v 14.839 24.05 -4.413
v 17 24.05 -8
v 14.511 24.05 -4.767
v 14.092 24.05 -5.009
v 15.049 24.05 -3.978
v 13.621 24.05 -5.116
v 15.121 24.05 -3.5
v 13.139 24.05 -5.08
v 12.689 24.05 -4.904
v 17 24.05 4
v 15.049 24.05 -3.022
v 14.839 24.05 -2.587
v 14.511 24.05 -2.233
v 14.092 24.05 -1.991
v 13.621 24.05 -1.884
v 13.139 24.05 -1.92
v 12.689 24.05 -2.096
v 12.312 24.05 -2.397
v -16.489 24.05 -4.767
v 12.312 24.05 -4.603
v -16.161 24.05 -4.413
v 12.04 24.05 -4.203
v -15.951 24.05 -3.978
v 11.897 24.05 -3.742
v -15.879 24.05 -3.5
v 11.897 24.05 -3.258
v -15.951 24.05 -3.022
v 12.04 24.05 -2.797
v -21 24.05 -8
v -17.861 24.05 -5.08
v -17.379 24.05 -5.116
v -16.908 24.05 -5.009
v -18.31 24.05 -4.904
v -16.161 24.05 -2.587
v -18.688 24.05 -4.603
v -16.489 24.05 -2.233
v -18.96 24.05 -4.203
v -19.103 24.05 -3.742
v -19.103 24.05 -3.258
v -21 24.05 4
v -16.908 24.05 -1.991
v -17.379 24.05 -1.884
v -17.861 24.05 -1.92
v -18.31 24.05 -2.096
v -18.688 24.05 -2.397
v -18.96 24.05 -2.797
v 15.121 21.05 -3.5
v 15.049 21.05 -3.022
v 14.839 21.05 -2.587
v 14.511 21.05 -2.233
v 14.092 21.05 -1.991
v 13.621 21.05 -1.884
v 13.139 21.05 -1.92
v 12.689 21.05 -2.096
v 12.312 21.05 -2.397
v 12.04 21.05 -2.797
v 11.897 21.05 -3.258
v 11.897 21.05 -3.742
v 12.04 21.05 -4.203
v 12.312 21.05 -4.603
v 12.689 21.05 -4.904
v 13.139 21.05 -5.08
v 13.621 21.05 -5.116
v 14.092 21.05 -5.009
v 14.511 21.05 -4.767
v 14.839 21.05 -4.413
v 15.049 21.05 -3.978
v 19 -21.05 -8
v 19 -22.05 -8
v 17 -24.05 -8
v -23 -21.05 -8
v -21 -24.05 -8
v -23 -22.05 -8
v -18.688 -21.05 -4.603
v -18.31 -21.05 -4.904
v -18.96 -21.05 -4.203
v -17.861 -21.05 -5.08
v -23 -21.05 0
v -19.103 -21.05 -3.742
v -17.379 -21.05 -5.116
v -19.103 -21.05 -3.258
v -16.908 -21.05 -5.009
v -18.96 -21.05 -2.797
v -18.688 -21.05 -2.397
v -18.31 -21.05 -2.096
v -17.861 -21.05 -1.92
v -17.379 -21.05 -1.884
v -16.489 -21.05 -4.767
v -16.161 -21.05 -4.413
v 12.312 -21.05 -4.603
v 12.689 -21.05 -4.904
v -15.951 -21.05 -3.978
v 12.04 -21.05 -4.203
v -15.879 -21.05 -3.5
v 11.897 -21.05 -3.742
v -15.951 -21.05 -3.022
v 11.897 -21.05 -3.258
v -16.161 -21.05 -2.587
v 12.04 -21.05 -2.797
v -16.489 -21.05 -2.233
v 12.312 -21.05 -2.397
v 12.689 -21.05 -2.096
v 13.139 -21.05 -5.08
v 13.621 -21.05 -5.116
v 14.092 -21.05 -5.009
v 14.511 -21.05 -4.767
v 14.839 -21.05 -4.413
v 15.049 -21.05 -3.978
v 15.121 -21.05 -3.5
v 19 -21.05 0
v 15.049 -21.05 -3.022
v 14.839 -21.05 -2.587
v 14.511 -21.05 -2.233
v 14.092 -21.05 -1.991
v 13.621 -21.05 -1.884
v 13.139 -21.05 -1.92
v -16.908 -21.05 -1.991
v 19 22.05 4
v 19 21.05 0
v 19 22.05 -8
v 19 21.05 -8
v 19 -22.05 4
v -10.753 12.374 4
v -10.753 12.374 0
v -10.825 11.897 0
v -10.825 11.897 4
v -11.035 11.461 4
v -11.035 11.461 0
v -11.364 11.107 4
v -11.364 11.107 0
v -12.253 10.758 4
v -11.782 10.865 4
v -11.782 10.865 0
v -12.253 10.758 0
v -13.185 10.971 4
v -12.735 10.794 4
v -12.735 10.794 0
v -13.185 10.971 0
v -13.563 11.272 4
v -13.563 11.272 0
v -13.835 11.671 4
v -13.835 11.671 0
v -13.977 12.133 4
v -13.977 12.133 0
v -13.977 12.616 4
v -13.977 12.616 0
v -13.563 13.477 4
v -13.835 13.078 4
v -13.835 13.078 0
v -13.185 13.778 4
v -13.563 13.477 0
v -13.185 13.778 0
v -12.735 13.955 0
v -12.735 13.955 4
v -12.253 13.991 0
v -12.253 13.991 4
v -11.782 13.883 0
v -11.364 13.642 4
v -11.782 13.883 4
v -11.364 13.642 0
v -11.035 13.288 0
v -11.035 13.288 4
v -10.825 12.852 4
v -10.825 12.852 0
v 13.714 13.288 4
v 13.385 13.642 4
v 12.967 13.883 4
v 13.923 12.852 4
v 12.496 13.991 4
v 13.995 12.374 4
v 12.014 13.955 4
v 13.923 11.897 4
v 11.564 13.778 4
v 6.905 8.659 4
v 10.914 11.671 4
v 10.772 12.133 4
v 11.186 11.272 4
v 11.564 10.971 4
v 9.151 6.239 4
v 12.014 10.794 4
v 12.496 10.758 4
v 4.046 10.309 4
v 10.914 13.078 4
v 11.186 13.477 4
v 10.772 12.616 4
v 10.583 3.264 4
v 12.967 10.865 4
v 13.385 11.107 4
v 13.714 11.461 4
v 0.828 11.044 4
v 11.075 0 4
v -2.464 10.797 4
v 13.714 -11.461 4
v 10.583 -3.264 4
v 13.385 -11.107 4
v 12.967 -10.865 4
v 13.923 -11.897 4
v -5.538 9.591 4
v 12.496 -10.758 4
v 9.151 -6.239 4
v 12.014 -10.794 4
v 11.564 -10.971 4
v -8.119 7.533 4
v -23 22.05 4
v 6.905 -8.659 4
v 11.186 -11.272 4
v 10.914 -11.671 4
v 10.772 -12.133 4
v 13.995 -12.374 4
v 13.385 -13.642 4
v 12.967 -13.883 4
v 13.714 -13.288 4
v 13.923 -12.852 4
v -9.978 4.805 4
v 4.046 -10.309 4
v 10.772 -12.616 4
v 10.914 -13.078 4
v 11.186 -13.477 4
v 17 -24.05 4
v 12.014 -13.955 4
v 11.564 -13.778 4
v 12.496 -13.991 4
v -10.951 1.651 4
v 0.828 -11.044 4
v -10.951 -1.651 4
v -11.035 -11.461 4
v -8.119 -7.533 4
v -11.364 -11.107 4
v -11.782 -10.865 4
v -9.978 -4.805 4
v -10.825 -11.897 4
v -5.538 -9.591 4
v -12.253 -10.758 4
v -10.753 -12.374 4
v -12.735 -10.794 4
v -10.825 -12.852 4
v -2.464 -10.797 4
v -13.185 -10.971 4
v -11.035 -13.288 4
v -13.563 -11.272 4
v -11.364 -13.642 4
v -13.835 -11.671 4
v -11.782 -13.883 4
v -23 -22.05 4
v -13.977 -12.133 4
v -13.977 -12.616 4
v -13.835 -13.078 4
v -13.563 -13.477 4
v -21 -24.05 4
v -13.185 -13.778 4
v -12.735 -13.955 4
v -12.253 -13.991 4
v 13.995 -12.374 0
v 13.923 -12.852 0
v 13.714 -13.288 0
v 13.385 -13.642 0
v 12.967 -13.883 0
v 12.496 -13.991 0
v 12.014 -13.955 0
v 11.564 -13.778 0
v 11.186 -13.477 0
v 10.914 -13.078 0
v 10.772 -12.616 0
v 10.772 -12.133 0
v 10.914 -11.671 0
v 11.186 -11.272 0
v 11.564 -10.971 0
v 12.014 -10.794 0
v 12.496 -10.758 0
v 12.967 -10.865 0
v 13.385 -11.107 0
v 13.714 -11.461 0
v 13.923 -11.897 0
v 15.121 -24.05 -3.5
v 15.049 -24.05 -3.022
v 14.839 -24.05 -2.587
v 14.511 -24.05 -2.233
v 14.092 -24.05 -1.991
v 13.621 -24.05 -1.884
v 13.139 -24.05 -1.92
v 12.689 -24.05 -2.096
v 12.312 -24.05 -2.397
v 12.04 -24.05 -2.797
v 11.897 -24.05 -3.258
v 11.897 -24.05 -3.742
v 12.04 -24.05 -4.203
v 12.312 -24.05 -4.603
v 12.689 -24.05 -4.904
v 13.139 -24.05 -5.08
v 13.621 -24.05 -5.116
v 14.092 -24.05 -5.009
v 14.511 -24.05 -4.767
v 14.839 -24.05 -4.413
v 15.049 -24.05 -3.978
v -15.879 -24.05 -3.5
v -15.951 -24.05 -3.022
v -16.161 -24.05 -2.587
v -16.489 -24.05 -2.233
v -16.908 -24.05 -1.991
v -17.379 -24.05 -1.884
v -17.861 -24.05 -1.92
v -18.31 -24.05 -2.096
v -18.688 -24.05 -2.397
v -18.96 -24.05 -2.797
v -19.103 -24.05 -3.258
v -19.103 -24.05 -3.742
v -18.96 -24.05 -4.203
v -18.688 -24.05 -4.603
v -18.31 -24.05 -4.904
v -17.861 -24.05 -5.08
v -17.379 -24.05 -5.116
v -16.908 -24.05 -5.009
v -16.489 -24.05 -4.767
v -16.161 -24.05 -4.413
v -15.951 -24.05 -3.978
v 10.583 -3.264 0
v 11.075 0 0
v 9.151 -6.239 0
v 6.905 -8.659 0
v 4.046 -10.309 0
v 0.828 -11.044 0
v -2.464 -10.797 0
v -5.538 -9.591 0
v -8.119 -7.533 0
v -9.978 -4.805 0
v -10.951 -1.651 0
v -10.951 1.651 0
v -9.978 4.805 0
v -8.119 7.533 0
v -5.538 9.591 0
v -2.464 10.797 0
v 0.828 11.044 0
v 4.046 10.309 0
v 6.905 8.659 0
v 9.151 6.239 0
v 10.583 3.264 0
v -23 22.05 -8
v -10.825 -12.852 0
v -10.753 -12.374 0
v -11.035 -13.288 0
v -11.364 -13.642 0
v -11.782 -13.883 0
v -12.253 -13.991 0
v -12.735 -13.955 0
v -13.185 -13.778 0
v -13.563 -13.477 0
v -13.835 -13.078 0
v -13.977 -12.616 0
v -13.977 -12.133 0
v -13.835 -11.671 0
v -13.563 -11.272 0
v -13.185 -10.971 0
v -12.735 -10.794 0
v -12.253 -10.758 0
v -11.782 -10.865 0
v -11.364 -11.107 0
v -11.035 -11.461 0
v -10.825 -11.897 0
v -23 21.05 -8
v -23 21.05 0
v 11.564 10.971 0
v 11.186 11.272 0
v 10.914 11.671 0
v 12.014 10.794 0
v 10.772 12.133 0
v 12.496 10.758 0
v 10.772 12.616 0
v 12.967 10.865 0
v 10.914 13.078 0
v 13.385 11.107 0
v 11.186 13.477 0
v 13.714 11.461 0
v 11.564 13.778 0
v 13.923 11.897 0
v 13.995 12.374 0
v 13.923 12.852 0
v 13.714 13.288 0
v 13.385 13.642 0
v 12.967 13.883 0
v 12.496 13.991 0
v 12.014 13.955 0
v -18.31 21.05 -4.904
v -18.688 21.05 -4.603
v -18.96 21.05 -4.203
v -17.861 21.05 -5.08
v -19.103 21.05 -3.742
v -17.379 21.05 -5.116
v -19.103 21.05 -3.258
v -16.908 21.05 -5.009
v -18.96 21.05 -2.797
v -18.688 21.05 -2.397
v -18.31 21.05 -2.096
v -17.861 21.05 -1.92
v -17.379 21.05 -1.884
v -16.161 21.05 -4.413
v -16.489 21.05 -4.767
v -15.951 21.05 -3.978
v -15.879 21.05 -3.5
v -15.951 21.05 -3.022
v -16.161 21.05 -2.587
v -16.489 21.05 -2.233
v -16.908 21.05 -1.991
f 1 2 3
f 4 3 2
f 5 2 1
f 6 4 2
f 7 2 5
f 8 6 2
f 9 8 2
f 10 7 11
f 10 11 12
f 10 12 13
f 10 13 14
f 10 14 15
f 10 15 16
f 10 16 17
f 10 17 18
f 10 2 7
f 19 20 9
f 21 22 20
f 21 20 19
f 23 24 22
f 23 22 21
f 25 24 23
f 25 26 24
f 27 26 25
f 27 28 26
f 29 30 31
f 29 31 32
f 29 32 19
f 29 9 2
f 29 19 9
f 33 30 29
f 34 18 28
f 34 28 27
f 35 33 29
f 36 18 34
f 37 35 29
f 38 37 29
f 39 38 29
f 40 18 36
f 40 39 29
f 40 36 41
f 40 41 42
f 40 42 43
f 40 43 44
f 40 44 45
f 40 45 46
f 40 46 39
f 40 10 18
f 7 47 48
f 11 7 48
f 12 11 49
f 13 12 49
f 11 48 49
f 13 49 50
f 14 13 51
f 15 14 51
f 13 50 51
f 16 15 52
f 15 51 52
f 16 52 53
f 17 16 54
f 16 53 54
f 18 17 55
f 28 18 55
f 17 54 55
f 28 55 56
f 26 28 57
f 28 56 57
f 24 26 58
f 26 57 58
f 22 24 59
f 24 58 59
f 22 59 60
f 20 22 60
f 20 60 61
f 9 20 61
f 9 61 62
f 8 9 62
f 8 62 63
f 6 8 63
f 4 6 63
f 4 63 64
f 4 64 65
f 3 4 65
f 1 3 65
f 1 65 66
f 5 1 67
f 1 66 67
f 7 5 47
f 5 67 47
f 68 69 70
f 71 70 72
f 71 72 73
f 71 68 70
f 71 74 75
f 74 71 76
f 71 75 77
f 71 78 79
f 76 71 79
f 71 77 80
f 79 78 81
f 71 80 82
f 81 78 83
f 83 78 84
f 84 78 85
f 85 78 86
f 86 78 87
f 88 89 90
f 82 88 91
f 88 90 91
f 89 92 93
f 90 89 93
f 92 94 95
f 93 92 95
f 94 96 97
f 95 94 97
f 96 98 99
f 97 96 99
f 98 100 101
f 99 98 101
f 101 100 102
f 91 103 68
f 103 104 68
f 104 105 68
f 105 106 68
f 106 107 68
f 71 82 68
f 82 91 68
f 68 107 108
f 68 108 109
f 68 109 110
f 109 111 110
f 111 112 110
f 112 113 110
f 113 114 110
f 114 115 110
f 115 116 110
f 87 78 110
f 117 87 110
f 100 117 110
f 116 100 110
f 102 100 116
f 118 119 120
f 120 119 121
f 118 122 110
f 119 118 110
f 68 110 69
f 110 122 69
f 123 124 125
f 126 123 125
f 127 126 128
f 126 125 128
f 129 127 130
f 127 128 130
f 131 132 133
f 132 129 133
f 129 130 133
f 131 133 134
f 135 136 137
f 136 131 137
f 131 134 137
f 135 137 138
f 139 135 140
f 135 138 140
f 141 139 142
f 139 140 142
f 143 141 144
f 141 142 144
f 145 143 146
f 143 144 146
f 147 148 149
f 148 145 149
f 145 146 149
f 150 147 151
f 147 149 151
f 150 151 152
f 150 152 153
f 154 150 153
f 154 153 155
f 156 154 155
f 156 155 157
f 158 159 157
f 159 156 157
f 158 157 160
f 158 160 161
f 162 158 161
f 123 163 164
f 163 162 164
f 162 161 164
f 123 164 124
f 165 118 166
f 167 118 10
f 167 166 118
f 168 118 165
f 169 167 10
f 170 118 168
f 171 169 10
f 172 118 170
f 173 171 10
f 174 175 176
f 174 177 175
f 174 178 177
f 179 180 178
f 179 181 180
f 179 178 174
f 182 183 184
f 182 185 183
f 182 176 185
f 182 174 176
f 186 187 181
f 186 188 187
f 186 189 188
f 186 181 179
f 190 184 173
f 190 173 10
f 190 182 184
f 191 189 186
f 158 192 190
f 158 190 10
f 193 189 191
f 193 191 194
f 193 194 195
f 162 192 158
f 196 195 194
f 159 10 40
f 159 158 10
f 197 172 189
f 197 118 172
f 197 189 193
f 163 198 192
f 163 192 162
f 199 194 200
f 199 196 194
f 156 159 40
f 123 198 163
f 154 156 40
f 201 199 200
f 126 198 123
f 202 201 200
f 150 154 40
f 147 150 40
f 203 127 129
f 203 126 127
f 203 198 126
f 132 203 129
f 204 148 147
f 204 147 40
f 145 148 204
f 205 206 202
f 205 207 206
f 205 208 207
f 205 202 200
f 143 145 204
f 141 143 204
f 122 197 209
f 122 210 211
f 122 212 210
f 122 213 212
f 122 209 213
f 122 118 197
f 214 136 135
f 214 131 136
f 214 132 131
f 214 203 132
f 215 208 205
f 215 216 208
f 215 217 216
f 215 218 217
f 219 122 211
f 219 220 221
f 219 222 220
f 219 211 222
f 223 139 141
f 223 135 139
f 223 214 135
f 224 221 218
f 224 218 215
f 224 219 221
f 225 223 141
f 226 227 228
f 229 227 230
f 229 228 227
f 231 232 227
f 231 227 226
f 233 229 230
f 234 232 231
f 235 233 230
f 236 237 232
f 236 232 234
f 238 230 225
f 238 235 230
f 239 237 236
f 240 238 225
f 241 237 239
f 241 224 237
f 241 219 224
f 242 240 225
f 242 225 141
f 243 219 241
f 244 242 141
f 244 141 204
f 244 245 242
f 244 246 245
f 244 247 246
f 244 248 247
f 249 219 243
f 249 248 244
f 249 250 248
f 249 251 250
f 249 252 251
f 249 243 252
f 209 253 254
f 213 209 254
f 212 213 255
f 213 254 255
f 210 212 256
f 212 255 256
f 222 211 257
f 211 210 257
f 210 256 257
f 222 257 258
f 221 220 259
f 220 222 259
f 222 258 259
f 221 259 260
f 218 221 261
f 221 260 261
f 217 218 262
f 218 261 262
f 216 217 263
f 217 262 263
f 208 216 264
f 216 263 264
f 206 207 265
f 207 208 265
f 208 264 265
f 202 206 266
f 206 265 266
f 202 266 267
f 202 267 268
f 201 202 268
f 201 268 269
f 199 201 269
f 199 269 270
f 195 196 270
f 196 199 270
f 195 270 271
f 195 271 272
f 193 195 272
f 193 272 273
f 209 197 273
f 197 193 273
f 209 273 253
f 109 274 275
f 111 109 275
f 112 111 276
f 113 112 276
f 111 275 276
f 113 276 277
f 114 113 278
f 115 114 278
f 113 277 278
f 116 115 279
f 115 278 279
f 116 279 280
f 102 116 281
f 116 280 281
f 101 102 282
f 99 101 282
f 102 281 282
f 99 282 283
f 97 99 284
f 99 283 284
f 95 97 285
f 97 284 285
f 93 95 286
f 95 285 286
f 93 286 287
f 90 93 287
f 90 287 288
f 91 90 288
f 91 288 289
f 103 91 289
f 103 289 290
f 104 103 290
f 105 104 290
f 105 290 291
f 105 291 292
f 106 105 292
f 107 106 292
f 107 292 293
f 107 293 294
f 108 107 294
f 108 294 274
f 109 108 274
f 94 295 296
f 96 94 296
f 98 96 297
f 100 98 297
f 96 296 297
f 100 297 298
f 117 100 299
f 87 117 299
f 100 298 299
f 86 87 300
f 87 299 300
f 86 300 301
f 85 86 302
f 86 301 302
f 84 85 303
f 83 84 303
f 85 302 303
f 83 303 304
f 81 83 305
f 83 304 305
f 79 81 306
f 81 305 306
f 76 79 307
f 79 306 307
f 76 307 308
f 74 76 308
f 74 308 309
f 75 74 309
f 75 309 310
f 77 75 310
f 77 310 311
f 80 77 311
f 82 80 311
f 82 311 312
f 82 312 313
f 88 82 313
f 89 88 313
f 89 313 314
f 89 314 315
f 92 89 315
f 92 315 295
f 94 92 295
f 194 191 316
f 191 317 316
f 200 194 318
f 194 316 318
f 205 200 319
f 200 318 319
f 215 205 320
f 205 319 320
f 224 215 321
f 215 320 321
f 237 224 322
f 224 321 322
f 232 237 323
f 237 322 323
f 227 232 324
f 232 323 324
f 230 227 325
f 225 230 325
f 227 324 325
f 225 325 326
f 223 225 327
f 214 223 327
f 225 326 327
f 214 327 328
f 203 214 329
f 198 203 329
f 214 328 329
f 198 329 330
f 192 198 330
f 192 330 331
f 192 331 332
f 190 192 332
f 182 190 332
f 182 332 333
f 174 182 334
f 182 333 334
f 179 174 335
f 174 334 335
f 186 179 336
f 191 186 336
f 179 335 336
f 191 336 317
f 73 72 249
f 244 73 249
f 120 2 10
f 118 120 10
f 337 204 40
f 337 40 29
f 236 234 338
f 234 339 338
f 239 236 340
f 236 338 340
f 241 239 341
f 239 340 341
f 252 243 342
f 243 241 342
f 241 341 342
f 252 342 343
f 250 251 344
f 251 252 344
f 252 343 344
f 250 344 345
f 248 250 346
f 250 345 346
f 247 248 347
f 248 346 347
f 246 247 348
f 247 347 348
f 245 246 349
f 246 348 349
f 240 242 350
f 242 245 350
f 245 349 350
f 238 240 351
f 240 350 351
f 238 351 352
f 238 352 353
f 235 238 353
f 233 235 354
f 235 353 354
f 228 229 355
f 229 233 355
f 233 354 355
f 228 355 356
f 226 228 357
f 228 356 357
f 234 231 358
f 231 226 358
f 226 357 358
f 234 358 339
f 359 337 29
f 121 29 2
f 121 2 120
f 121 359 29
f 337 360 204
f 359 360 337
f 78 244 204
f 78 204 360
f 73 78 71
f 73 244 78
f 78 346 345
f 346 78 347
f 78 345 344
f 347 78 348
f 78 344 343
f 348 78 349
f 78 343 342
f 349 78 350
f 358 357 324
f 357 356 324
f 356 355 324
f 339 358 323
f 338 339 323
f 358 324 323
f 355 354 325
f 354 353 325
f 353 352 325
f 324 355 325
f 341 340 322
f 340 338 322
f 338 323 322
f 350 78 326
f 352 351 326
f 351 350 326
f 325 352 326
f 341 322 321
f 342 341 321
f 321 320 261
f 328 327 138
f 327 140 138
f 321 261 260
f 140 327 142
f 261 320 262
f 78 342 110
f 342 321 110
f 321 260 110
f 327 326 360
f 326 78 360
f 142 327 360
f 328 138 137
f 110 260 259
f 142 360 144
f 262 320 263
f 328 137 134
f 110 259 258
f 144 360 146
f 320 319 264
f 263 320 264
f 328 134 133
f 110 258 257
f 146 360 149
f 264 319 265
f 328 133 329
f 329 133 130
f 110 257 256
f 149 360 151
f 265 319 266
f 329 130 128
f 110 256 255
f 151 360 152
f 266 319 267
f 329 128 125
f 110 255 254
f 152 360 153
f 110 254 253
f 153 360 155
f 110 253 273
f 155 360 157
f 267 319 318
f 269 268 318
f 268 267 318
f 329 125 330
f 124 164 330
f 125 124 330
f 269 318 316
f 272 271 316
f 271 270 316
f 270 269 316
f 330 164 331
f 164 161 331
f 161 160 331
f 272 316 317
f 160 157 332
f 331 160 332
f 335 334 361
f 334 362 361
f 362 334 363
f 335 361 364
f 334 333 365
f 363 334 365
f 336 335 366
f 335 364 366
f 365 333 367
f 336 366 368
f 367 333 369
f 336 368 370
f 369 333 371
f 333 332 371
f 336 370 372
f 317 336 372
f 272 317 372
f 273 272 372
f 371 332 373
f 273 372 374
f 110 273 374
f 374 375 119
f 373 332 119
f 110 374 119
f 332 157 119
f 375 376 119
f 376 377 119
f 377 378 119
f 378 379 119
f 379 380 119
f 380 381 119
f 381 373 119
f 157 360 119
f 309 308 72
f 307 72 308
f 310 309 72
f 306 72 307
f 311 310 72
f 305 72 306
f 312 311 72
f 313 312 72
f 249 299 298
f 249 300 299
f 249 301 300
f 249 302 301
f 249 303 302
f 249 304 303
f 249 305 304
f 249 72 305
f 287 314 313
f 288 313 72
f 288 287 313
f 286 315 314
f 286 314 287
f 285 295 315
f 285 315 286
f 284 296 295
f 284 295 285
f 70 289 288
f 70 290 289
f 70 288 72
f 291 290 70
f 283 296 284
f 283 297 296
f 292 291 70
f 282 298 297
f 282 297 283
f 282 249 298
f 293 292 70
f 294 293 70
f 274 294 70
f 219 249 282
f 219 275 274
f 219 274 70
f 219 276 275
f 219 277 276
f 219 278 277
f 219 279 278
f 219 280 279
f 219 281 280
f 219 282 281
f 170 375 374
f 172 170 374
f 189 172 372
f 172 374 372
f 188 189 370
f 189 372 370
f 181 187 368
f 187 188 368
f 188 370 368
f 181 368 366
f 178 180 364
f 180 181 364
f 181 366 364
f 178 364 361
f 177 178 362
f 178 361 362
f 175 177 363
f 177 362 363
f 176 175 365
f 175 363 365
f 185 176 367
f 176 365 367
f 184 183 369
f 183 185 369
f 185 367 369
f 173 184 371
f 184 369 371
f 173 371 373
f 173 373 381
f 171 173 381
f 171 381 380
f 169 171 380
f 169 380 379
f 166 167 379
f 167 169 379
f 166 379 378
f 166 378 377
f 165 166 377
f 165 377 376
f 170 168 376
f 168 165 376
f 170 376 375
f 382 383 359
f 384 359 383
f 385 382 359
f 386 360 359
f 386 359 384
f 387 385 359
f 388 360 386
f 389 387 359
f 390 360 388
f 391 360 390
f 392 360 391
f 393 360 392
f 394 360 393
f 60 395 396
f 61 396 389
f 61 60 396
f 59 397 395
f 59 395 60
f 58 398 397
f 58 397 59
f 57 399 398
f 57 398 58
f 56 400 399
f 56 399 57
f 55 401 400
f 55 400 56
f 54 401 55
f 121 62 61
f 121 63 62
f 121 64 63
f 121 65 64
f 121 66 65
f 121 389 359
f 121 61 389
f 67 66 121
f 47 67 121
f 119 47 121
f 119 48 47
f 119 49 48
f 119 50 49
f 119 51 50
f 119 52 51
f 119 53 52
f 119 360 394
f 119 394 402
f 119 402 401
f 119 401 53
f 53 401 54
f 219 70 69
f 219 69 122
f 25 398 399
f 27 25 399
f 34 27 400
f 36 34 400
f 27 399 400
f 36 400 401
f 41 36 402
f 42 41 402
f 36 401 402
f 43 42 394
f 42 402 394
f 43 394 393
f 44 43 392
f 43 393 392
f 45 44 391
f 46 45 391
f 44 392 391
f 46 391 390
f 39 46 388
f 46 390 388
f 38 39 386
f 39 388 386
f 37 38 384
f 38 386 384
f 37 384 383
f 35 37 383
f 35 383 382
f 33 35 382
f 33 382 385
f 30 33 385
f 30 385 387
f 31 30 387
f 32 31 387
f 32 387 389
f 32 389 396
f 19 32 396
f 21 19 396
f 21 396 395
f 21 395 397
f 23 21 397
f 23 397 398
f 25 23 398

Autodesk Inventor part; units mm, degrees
ref_plane "YZ Plane" through (0, 0, 0) normal (1, 0, 0) x (0, 1, 0)
ref_plane "XZ Plane" through (0, 0, 0) normal (0, 1, 0) x (-1, 0, 0)
sketch "Base" plane through (0, 0, 0) normal (0, 0, 1) x (1, 0, 0)
  circle A0 centre (0, 0) radius 11 construction
  line L0 (18, 21) -> (-22, 21) construction
  line L1 (-22, -21) -> (18, -21) construction
  line L2 (19, -20) -> (19, 20) construction
  line L3 (-23, 20) -> (-23, -20) construction
  circle A1 centre (0, 0) radius 11.075
  line L4 (-197.84, 0) -> (55.14, 0) construction
  line L5 (-23, 23.05) -> (19, 23.05)
  line L6 (19, 23.05) -> (19, 21.05)
  line L7 (19, 21.05) -> (-23, 21.05)
  line L8 (-23, 21.05) -> (-23, 23.05)
  line L9 (-23, 21.05) -> (19, 21.05)
  line L10 (19, 21.05) -> (19, 0)
  line L11 (19, 0) -> (-23, 0)
  line L12 (-23, 0) -> (-23, 21.05)
  line L13 (-23, -23.05) -> (19, -23.05)
  line L14 (19, -23.05) -> (19, -21.05)
  line L15 (19, -21.05) -> (-23, -21.05)
  line L16 (-23, -21.05) -> (-23, -23.05)
  line L17 (19, -21.05) -> (19, 0)
  line L18 (-23, 0) -> (-23, -21.05)
  line L19 (0, 14) -> (0, 0) construction
  line L20 (0, 0) -> (0, -14) construction
  circle A2 centre (12.3744, -12.3744) radius 1.621 projected
  circle A3 centre (12.3744, 12.3744) radius 1.621 projected
  circle A4 centre (-12.3744, 12.3744) radius 1.621 projected
  circle A5 centre (-12.3744, -12.3744) radius 1.621 projected
  dimension "d0" = 22.15
  dimension "d1" = 2
  dimension "d4" = 0.05
extrude "BaseFeature" add sketch "Base" along normal blind 4 contours L11 L17 L15 L18 A1 | A1 L11 L12 L7 L10 | L7 L8 L5 L6 | L14 L13 L16 L15
ref_plane "Work Plane1" through (-20.5858, -18.5858, -56) normal (0, 0, -1) x (0, 1, 0)
sketch "Sides" plane through (0, 0, 0) normal (0, 0, -1) x (-1, 0, 0)
  line L0 (23, -23.05) -> (-19, -23.05) projected
  line L1 (-19, -23.05) -> (23, -23.05)
  line L2 (23, -23.05) -> (23, -21.05)
  line L3 (23, -21.05) -> (-19, -21.05)
  line L4 (-19, -21.05) -> (-19, -23.05)
  line L5 (-19, 23.05) -> (23, 23.05) projected
  line L6 (-19, 23.05) -> (23, 23.05)
  line L7 (23, 23.05) -> (23, 21.05)
  line L8 (23, 21.05) -> (-19, 21.05)
  line L9 (-19, 21.05) -> (-19, 23.05)
  point P0 (0, 0)
extrude "Extrusion2" add sketch "Sides" along normal blind 8
sketch "Sketch3" plane through (-23, -23.05, 4) normal (0, -1, 0) x (1, 0, 0)
  line L0 (42, -12) -> (42, 0) projected
  line L1 (0, 0) -> (42, 0) projected
  line L2 (0, -12) -> (0, 0) projected
  line L3 (42, -12) -> (0, -12) projected
  point P0 (23, -4)
extrude "Extrusion3" add sketch "Sketch3" along normal blind 1
mirror "Mirror1" about plane through (0, 0, 0) normal (0, 1, 0) of "Extrusion3"
sketch "Sketch4" plane through (-23, -24.05, 4) normal (0, -1, 0) x (1, 0, 0)
  line L0 (0, 0) -> (0, -12) construction
  line L1 (42, -4) -> (42, -12) construction
  circle A0 centre (5.5, -7.5) radius 1.621
  line L2 (21, 0) -> (21, -12) construction
  line L3 (0, -12) -> (42, -12) construction
  line L4 (42, 0) -> (0, 0) construction
  circle A1 centre (36.5, -7.5) radius 1.621
  point P0 (23, -4)
  dimension "d9" = 3.242
  dimension "d15" = 5.5
  dimension "d16" = 4.5
extrude "Extrusion4" cut sketch "Sketch4" against normal through all
chamfer "Chamfer1" distance 2 angle 45 4 edges at (19, 24.05, -2) (-23, 24.05, -2) (19, -24.05, -2) (-23, -24.05, -2)
properties part number "MotorMount"
